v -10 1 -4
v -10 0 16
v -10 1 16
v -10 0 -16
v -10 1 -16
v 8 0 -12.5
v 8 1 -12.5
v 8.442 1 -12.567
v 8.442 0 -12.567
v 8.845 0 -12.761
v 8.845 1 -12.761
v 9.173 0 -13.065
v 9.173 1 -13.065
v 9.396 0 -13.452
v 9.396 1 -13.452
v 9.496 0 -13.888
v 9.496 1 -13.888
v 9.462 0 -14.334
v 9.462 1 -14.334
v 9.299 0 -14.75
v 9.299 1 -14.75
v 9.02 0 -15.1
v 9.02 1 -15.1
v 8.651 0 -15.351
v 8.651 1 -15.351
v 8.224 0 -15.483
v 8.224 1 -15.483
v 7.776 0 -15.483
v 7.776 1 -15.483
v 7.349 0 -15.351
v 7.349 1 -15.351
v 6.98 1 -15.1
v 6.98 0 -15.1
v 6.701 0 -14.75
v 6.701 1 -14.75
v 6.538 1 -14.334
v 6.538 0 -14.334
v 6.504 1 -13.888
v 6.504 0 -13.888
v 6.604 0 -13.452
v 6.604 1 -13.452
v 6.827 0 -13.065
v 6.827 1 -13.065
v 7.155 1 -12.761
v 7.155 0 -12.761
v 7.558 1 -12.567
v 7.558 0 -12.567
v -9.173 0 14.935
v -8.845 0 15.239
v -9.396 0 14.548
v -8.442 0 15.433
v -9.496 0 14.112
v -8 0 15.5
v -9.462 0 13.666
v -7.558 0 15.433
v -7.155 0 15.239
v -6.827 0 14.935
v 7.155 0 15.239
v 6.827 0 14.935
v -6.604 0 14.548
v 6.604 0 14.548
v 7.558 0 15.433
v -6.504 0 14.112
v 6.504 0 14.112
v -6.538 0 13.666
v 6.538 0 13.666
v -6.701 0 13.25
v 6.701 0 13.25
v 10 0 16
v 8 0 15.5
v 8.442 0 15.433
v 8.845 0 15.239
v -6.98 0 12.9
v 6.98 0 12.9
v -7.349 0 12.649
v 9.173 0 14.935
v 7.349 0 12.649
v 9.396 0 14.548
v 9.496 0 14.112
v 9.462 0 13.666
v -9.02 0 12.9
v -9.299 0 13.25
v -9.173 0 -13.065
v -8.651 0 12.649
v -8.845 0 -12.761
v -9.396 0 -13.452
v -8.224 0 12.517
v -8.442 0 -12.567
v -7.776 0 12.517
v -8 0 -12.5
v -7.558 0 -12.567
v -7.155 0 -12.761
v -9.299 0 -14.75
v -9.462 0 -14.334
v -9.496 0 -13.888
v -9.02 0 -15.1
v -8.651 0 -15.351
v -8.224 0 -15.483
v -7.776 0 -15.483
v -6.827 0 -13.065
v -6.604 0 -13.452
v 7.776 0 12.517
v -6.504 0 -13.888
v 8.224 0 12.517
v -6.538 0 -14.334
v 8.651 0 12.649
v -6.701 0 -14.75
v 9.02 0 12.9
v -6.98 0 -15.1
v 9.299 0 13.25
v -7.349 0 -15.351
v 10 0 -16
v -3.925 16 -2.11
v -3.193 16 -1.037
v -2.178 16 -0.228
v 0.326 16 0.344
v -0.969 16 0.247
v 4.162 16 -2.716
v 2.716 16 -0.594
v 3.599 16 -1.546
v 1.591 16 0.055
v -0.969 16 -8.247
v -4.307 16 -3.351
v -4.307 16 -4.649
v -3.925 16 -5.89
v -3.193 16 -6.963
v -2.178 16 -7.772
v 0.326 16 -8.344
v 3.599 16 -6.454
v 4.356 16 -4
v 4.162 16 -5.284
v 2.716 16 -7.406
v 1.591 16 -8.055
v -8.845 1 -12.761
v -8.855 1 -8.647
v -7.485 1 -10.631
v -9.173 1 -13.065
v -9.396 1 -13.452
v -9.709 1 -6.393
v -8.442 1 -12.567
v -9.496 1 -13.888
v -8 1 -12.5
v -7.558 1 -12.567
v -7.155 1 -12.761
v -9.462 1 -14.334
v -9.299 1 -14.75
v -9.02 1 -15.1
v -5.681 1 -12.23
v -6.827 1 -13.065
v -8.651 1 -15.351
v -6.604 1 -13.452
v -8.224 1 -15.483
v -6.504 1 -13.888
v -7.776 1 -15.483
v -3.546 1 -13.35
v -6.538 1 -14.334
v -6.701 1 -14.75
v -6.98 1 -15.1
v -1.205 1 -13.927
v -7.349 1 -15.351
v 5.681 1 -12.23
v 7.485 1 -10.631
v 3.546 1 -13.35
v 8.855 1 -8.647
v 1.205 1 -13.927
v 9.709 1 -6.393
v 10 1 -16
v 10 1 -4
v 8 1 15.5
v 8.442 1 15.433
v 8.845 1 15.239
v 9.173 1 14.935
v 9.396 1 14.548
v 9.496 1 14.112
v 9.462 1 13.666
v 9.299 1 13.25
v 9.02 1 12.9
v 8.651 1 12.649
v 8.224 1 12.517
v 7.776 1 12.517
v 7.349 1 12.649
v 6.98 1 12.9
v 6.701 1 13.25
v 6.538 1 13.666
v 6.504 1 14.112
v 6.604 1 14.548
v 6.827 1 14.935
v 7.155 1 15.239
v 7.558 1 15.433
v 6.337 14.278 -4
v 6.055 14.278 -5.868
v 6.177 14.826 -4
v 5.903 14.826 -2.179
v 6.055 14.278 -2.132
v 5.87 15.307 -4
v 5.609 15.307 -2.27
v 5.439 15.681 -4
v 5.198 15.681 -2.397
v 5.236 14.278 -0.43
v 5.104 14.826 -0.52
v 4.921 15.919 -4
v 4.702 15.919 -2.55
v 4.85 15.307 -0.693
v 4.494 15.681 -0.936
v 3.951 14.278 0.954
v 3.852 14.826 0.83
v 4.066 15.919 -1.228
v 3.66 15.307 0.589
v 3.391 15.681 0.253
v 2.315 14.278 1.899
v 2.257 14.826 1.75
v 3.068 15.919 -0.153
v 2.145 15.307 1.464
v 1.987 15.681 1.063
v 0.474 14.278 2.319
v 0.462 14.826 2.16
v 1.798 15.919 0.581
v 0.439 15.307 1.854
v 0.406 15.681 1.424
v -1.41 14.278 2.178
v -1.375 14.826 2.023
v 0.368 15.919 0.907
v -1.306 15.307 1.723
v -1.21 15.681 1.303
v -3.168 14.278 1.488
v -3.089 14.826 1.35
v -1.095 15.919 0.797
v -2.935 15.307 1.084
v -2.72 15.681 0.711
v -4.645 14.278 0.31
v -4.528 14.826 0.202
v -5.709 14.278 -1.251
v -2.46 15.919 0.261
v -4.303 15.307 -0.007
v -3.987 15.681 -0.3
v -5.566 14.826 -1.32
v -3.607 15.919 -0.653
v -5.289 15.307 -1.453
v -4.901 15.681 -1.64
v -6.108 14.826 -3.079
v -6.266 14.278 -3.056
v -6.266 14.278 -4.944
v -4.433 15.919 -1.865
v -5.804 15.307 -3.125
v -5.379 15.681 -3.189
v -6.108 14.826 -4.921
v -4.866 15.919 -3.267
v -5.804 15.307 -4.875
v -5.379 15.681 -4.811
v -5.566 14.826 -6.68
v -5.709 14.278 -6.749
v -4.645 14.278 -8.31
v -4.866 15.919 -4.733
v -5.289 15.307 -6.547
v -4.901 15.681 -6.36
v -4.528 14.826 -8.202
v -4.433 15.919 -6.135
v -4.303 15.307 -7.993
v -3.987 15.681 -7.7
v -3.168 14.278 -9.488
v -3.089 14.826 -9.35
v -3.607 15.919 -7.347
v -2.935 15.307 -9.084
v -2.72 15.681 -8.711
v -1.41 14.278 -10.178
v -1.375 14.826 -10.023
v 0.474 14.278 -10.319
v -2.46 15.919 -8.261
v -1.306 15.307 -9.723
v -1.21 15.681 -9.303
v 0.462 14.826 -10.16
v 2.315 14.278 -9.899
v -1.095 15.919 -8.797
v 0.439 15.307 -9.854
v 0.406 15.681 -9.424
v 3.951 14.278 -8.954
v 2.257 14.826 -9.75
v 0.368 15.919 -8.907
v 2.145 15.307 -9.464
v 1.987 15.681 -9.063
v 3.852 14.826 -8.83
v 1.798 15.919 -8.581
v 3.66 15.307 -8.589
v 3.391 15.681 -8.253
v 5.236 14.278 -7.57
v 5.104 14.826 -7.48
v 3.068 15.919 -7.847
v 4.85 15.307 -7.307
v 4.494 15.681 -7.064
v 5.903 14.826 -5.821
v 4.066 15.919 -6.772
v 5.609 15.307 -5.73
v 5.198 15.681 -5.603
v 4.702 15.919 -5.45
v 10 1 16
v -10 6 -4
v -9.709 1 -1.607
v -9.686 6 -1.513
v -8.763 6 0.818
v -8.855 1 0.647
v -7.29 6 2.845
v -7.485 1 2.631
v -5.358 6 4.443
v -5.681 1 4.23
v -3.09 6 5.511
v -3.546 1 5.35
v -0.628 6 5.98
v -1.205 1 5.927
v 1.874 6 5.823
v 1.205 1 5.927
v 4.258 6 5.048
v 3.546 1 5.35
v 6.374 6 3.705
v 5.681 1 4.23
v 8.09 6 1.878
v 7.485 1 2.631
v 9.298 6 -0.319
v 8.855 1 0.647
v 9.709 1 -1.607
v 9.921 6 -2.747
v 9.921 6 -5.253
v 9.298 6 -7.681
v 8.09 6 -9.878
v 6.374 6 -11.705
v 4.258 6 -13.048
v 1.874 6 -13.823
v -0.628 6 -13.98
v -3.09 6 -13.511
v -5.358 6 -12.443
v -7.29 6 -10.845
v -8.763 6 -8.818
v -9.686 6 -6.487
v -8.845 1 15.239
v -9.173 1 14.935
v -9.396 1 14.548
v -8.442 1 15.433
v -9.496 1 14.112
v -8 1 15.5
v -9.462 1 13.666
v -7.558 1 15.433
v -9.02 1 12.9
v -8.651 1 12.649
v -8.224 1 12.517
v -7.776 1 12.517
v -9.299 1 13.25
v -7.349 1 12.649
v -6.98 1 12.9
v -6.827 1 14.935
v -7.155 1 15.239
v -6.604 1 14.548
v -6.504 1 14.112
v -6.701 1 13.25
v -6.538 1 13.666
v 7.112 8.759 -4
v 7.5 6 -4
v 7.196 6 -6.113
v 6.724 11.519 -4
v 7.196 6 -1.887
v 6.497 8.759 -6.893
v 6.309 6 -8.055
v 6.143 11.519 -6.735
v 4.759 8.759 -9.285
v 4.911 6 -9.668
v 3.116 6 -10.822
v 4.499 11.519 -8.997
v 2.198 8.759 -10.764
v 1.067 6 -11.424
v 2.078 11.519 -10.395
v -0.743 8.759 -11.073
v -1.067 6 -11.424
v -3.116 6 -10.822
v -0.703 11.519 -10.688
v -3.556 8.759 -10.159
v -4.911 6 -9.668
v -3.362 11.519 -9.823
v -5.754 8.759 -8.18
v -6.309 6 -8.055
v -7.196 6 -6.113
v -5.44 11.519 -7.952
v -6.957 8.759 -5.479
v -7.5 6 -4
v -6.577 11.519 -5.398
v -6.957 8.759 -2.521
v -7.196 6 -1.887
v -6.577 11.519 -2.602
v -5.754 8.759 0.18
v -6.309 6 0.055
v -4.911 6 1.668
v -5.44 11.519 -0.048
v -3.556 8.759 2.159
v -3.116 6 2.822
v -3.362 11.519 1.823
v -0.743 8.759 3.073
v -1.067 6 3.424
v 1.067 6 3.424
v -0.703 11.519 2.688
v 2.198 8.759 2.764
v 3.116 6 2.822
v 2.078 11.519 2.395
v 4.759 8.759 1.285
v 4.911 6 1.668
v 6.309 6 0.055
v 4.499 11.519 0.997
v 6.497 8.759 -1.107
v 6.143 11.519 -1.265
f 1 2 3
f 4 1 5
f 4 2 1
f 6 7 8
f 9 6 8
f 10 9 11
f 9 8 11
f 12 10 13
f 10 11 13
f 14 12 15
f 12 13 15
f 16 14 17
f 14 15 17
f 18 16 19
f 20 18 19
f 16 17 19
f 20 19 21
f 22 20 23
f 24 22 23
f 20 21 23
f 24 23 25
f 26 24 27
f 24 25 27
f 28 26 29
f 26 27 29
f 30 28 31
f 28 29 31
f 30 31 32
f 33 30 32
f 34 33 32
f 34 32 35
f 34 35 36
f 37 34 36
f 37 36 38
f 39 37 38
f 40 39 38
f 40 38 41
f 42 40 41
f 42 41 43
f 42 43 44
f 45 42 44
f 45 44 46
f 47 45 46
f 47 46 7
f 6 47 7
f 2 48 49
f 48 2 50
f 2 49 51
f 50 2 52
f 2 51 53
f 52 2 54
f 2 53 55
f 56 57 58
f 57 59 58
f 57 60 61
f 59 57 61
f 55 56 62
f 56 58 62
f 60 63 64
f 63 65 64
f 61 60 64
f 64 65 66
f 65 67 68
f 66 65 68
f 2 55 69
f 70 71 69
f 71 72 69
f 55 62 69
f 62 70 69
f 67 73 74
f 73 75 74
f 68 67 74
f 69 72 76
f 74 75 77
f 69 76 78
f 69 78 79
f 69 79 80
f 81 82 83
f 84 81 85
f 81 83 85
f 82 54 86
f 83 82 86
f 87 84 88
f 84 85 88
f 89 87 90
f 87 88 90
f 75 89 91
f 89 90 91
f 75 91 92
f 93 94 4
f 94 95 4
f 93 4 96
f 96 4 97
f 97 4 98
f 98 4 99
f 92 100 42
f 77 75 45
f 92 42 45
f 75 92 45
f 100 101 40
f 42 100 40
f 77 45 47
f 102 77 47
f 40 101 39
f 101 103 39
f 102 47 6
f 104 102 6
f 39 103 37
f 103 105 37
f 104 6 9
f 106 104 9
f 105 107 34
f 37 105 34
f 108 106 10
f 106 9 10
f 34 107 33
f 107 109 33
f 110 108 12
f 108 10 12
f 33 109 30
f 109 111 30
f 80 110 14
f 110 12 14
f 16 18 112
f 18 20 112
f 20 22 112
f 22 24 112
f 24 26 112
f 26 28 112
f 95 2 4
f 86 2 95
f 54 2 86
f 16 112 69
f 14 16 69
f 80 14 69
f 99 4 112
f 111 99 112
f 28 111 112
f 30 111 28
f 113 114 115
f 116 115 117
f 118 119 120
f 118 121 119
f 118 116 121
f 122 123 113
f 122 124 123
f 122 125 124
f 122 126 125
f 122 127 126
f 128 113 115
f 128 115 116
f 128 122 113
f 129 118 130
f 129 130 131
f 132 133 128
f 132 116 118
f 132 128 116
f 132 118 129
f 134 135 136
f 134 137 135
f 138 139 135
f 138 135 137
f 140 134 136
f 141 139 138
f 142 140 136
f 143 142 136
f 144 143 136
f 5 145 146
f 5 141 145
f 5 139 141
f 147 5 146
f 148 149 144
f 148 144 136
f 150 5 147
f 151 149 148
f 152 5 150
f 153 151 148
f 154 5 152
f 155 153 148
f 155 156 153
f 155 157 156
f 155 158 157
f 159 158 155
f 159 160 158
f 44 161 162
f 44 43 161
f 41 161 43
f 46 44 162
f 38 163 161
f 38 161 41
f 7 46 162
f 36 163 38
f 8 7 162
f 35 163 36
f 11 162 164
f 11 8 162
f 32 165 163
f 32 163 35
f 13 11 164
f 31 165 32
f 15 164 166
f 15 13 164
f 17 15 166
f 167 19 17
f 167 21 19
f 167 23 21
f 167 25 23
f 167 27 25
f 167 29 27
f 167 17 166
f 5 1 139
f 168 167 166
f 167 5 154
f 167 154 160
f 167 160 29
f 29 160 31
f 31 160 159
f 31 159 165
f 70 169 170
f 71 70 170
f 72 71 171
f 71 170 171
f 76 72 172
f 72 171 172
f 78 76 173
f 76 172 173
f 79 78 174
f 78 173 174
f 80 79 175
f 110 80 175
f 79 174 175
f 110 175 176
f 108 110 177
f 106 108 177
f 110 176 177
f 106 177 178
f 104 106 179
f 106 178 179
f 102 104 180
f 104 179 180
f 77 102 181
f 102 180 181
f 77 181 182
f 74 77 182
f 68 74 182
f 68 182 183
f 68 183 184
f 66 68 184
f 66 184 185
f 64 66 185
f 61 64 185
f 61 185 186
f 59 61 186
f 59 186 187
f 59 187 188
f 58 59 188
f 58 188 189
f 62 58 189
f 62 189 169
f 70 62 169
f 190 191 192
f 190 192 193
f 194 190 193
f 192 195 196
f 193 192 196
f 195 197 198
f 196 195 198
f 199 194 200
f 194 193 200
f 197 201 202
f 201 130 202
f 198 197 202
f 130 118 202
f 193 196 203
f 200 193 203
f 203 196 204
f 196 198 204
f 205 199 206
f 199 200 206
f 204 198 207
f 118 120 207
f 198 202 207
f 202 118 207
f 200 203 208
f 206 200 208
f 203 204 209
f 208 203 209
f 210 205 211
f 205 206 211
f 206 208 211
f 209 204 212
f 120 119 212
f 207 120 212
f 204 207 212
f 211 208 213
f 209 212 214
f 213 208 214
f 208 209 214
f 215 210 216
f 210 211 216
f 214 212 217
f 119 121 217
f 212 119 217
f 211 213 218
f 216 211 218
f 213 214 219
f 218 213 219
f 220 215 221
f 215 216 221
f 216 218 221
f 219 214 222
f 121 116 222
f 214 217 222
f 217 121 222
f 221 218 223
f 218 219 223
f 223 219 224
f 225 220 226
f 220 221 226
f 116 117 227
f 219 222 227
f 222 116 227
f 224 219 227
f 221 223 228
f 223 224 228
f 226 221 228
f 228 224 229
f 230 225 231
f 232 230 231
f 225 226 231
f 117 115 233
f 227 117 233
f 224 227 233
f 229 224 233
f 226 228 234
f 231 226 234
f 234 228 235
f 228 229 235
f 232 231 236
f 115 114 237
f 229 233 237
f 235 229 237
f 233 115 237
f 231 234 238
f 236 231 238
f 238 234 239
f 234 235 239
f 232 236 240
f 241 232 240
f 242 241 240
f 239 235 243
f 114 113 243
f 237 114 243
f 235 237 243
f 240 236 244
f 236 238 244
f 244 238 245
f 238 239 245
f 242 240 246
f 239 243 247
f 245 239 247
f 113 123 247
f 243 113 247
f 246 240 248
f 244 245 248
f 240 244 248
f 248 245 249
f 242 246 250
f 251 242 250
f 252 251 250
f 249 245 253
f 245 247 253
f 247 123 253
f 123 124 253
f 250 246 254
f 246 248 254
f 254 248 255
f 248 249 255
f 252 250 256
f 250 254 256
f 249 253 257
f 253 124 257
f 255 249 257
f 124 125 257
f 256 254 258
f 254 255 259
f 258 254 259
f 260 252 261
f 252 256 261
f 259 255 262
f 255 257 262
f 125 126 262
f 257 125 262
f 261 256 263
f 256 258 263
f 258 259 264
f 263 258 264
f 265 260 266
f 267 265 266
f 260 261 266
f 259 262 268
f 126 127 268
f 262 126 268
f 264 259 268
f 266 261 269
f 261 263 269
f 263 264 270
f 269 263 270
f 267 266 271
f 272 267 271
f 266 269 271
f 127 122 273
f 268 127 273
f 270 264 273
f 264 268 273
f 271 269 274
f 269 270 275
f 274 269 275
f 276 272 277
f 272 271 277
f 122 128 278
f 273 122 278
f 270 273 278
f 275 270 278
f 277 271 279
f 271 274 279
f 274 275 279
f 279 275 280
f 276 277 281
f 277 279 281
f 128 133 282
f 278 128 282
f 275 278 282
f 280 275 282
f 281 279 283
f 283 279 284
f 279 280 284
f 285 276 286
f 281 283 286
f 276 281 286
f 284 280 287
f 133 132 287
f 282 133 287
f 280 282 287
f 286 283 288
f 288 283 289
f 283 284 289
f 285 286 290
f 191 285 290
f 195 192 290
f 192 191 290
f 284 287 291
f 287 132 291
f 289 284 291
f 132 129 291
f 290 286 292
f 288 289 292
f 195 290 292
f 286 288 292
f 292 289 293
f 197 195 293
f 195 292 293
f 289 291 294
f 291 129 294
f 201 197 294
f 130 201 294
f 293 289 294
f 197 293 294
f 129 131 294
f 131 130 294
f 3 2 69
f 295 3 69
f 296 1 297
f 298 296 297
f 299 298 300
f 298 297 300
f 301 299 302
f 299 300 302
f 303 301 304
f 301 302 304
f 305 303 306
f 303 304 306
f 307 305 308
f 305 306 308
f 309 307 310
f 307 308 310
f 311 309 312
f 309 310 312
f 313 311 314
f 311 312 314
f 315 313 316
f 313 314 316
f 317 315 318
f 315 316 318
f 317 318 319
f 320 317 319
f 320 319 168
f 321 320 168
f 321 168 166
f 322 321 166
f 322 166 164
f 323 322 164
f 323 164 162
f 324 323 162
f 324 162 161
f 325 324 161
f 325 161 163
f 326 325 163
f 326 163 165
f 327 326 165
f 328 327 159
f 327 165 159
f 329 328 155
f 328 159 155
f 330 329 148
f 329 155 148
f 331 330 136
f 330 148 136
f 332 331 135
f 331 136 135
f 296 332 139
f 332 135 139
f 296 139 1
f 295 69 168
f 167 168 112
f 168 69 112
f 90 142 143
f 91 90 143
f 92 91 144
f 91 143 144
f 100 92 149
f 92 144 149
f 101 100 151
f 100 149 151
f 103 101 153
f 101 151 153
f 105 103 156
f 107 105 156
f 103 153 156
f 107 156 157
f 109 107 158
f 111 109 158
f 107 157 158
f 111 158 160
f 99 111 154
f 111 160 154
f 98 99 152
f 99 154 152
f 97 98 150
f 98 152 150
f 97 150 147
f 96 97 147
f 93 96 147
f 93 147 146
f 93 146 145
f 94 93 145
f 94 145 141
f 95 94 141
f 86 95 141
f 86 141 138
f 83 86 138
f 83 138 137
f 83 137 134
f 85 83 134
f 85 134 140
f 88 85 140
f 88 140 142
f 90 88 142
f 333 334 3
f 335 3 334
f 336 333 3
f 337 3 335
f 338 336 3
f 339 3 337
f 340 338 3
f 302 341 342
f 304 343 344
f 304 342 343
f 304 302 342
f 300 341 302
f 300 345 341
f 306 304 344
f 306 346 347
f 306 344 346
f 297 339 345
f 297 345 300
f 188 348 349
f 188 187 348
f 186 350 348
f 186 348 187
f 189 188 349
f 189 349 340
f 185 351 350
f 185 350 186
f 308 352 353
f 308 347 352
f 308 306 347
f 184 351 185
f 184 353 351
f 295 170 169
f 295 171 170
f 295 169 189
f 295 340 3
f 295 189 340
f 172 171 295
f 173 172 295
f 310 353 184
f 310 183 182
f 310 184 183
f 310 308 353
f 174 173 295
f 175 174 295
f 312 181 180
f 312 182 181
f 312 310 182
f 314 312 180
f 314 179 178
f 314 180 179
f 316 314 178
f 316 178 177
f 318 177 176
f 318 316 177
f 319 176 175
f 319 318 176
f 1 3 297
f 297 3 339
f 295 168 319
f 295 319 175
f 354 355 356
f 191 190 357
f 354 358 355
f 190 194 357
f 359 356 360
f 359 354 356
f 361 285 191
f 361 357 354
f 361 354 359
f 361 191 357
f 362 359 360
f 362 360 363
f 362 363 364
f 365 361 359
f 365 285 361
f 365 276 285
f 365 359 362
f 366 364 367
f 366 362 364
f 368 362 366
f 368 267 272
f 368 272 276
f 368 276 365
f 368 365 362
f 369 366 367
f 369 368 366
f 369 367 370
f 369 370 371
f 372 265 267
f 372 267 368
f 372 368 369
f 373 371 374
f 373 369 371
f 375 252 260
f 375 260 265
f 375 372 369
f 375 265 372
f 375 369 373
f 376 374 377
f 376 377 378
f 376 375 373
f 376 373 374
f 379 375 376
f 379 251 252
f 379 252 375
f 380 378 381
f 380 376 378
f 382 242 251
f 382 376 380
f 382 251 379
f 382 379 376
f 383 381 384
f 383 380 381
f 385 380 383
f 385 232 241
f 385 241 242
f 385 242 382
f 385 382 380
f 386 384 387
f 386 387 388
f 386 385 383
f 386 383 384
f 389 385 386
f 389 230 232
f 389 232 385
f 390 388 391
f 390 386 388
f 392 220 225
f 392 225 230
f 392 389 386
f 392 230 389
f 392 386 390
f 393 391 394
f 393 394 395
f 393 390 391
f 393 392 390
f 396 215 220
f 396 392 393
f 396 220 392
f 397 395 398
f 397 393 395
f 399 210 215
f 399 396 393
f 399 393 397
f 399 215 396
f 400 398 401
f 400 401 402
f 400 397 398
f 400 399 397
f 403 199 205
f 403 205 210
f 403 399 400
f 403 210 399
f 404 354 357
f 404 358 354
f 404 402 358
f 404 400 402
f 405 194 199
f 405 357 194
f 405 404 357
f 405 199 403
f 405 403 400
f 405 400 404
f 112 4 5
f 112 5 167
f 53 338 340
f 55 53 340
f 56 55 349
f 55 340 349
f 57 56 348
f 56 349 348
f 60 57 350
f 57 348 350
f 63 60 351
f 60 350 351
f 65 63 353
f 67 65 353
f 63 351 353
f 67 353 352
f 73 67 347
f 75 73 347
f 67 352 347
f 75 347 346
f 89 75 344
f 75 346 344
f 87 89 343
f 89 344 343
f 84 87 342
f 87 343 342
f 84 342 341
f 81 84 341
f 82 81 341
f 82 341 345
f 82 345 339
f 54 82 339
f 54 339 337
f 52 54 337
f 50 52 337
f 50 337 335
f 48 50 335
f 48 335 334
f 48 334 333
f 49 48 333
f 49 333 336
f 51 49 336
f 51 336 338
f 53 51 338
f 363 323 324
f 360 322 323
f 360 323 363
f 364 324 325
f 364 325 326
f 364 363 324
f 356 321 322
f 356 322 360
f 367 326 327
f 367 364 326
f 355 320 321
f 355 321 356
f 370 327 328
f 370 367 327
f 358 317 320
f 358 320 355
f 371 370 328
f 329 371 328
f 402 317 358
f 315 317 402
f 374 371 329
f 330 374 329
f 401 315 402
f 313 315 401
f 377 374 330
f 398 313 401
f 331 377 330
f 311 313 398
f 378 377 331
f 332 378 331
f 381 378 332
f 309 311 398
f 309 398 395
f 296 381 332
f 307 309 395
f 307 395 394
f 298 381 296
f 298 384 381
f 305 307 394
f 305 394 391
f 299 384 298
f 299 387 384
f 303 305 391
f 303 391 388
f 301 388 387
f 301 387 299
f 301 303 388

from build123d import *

# Parameters (mm, degrees)
SKETCH1_W           = 20
SKETCH1_H           = 32
BOSS_EXTRUDE1_DEPTH = 1
SKETCH2_R           = 10
BOSS_EXTRUDE2_DEPTH = 5
SKETCH3_R           = 1.5
CUT_EXTRUDE1_DEPTH  = 5
SKETCH4_R           = 7.5
BOSS_EXTRUDE3_DEPTH = 10
BOSS_EXTRUDE3_TAPER = 8
FILLET1_R           = 2


with BuildPart() as part:
    # Sketch1 → Boss-Extrude1 (new body)
    with BuildSketch(Plane(origin=(0, 0, 0), x_dir=(1, 0, 0), z_dir=(0, 1, 0))):
        Rectangle(SKETCH1_W, SKETCH1_H)
    extrude(amount=BOSS_EXTRUDE1_DEPTH)

    # Sketch2 → Boss-Extrude2 (add)
    with BuildSketch(Plane(origin=(0, 1, 0), x_dir=(1, 0, 0), z_dir=(0, 1, 0))):
        with Locations(Location((0, 4, 0), (0, 0, 180))):
            Circle(SKETCH2_R)
    extrude(amount=BOSS_EXTRUDE2_DEPTH)

    # Sketch3 → Cut-Extrude1 (cut)
    with BuildSketch(Plane(origin=(0, 1, 0), x_dir=(1, 0, 0), z_dir=(0, 1, 0))):
        with Locations(Location((8, 14, 0), (0, 0, 270))):
            Circle(SKETCH3_R)
        with Locations(Location((-8, 14, 0), (0, 0, 270))):
            Circle(SKETCH3_R)
        with Locations(Location((8, -14, 0), (0, 0, 270))):
            Circle(SKETCH3_R)
        with Locations(Location((-8, -14, 0), (0, 0, 270))):
            Circle(SKETCH3_R)
    extrude(amount=-CUT_EXTRUDE1_DEPTH, mode=Mode.SUBTRACT)

    # Sketch4 → Boss-Extrude3 (add)
    with BuildSketch(Plane(origin=(0, 6, 0), x_dir=(1, 0, 0), z_dir=(0, 1, 0))):
        with Locations((0, 4)):
            Circle(SKETCH4_R)
    extrude(amount=BOSS_EXTRUDE3_DEPTH, taper=BOSS_EXTRUDE3_TAPER)

    # Fillet1
    fillet1_edges = [part.edges().sort_by_distance(p)[0] for p in [
        (-6.094591653, 16, -4),
    ]]
    fillet(fillet1_edges, radius=FILLET1_R)


solid = part.part
